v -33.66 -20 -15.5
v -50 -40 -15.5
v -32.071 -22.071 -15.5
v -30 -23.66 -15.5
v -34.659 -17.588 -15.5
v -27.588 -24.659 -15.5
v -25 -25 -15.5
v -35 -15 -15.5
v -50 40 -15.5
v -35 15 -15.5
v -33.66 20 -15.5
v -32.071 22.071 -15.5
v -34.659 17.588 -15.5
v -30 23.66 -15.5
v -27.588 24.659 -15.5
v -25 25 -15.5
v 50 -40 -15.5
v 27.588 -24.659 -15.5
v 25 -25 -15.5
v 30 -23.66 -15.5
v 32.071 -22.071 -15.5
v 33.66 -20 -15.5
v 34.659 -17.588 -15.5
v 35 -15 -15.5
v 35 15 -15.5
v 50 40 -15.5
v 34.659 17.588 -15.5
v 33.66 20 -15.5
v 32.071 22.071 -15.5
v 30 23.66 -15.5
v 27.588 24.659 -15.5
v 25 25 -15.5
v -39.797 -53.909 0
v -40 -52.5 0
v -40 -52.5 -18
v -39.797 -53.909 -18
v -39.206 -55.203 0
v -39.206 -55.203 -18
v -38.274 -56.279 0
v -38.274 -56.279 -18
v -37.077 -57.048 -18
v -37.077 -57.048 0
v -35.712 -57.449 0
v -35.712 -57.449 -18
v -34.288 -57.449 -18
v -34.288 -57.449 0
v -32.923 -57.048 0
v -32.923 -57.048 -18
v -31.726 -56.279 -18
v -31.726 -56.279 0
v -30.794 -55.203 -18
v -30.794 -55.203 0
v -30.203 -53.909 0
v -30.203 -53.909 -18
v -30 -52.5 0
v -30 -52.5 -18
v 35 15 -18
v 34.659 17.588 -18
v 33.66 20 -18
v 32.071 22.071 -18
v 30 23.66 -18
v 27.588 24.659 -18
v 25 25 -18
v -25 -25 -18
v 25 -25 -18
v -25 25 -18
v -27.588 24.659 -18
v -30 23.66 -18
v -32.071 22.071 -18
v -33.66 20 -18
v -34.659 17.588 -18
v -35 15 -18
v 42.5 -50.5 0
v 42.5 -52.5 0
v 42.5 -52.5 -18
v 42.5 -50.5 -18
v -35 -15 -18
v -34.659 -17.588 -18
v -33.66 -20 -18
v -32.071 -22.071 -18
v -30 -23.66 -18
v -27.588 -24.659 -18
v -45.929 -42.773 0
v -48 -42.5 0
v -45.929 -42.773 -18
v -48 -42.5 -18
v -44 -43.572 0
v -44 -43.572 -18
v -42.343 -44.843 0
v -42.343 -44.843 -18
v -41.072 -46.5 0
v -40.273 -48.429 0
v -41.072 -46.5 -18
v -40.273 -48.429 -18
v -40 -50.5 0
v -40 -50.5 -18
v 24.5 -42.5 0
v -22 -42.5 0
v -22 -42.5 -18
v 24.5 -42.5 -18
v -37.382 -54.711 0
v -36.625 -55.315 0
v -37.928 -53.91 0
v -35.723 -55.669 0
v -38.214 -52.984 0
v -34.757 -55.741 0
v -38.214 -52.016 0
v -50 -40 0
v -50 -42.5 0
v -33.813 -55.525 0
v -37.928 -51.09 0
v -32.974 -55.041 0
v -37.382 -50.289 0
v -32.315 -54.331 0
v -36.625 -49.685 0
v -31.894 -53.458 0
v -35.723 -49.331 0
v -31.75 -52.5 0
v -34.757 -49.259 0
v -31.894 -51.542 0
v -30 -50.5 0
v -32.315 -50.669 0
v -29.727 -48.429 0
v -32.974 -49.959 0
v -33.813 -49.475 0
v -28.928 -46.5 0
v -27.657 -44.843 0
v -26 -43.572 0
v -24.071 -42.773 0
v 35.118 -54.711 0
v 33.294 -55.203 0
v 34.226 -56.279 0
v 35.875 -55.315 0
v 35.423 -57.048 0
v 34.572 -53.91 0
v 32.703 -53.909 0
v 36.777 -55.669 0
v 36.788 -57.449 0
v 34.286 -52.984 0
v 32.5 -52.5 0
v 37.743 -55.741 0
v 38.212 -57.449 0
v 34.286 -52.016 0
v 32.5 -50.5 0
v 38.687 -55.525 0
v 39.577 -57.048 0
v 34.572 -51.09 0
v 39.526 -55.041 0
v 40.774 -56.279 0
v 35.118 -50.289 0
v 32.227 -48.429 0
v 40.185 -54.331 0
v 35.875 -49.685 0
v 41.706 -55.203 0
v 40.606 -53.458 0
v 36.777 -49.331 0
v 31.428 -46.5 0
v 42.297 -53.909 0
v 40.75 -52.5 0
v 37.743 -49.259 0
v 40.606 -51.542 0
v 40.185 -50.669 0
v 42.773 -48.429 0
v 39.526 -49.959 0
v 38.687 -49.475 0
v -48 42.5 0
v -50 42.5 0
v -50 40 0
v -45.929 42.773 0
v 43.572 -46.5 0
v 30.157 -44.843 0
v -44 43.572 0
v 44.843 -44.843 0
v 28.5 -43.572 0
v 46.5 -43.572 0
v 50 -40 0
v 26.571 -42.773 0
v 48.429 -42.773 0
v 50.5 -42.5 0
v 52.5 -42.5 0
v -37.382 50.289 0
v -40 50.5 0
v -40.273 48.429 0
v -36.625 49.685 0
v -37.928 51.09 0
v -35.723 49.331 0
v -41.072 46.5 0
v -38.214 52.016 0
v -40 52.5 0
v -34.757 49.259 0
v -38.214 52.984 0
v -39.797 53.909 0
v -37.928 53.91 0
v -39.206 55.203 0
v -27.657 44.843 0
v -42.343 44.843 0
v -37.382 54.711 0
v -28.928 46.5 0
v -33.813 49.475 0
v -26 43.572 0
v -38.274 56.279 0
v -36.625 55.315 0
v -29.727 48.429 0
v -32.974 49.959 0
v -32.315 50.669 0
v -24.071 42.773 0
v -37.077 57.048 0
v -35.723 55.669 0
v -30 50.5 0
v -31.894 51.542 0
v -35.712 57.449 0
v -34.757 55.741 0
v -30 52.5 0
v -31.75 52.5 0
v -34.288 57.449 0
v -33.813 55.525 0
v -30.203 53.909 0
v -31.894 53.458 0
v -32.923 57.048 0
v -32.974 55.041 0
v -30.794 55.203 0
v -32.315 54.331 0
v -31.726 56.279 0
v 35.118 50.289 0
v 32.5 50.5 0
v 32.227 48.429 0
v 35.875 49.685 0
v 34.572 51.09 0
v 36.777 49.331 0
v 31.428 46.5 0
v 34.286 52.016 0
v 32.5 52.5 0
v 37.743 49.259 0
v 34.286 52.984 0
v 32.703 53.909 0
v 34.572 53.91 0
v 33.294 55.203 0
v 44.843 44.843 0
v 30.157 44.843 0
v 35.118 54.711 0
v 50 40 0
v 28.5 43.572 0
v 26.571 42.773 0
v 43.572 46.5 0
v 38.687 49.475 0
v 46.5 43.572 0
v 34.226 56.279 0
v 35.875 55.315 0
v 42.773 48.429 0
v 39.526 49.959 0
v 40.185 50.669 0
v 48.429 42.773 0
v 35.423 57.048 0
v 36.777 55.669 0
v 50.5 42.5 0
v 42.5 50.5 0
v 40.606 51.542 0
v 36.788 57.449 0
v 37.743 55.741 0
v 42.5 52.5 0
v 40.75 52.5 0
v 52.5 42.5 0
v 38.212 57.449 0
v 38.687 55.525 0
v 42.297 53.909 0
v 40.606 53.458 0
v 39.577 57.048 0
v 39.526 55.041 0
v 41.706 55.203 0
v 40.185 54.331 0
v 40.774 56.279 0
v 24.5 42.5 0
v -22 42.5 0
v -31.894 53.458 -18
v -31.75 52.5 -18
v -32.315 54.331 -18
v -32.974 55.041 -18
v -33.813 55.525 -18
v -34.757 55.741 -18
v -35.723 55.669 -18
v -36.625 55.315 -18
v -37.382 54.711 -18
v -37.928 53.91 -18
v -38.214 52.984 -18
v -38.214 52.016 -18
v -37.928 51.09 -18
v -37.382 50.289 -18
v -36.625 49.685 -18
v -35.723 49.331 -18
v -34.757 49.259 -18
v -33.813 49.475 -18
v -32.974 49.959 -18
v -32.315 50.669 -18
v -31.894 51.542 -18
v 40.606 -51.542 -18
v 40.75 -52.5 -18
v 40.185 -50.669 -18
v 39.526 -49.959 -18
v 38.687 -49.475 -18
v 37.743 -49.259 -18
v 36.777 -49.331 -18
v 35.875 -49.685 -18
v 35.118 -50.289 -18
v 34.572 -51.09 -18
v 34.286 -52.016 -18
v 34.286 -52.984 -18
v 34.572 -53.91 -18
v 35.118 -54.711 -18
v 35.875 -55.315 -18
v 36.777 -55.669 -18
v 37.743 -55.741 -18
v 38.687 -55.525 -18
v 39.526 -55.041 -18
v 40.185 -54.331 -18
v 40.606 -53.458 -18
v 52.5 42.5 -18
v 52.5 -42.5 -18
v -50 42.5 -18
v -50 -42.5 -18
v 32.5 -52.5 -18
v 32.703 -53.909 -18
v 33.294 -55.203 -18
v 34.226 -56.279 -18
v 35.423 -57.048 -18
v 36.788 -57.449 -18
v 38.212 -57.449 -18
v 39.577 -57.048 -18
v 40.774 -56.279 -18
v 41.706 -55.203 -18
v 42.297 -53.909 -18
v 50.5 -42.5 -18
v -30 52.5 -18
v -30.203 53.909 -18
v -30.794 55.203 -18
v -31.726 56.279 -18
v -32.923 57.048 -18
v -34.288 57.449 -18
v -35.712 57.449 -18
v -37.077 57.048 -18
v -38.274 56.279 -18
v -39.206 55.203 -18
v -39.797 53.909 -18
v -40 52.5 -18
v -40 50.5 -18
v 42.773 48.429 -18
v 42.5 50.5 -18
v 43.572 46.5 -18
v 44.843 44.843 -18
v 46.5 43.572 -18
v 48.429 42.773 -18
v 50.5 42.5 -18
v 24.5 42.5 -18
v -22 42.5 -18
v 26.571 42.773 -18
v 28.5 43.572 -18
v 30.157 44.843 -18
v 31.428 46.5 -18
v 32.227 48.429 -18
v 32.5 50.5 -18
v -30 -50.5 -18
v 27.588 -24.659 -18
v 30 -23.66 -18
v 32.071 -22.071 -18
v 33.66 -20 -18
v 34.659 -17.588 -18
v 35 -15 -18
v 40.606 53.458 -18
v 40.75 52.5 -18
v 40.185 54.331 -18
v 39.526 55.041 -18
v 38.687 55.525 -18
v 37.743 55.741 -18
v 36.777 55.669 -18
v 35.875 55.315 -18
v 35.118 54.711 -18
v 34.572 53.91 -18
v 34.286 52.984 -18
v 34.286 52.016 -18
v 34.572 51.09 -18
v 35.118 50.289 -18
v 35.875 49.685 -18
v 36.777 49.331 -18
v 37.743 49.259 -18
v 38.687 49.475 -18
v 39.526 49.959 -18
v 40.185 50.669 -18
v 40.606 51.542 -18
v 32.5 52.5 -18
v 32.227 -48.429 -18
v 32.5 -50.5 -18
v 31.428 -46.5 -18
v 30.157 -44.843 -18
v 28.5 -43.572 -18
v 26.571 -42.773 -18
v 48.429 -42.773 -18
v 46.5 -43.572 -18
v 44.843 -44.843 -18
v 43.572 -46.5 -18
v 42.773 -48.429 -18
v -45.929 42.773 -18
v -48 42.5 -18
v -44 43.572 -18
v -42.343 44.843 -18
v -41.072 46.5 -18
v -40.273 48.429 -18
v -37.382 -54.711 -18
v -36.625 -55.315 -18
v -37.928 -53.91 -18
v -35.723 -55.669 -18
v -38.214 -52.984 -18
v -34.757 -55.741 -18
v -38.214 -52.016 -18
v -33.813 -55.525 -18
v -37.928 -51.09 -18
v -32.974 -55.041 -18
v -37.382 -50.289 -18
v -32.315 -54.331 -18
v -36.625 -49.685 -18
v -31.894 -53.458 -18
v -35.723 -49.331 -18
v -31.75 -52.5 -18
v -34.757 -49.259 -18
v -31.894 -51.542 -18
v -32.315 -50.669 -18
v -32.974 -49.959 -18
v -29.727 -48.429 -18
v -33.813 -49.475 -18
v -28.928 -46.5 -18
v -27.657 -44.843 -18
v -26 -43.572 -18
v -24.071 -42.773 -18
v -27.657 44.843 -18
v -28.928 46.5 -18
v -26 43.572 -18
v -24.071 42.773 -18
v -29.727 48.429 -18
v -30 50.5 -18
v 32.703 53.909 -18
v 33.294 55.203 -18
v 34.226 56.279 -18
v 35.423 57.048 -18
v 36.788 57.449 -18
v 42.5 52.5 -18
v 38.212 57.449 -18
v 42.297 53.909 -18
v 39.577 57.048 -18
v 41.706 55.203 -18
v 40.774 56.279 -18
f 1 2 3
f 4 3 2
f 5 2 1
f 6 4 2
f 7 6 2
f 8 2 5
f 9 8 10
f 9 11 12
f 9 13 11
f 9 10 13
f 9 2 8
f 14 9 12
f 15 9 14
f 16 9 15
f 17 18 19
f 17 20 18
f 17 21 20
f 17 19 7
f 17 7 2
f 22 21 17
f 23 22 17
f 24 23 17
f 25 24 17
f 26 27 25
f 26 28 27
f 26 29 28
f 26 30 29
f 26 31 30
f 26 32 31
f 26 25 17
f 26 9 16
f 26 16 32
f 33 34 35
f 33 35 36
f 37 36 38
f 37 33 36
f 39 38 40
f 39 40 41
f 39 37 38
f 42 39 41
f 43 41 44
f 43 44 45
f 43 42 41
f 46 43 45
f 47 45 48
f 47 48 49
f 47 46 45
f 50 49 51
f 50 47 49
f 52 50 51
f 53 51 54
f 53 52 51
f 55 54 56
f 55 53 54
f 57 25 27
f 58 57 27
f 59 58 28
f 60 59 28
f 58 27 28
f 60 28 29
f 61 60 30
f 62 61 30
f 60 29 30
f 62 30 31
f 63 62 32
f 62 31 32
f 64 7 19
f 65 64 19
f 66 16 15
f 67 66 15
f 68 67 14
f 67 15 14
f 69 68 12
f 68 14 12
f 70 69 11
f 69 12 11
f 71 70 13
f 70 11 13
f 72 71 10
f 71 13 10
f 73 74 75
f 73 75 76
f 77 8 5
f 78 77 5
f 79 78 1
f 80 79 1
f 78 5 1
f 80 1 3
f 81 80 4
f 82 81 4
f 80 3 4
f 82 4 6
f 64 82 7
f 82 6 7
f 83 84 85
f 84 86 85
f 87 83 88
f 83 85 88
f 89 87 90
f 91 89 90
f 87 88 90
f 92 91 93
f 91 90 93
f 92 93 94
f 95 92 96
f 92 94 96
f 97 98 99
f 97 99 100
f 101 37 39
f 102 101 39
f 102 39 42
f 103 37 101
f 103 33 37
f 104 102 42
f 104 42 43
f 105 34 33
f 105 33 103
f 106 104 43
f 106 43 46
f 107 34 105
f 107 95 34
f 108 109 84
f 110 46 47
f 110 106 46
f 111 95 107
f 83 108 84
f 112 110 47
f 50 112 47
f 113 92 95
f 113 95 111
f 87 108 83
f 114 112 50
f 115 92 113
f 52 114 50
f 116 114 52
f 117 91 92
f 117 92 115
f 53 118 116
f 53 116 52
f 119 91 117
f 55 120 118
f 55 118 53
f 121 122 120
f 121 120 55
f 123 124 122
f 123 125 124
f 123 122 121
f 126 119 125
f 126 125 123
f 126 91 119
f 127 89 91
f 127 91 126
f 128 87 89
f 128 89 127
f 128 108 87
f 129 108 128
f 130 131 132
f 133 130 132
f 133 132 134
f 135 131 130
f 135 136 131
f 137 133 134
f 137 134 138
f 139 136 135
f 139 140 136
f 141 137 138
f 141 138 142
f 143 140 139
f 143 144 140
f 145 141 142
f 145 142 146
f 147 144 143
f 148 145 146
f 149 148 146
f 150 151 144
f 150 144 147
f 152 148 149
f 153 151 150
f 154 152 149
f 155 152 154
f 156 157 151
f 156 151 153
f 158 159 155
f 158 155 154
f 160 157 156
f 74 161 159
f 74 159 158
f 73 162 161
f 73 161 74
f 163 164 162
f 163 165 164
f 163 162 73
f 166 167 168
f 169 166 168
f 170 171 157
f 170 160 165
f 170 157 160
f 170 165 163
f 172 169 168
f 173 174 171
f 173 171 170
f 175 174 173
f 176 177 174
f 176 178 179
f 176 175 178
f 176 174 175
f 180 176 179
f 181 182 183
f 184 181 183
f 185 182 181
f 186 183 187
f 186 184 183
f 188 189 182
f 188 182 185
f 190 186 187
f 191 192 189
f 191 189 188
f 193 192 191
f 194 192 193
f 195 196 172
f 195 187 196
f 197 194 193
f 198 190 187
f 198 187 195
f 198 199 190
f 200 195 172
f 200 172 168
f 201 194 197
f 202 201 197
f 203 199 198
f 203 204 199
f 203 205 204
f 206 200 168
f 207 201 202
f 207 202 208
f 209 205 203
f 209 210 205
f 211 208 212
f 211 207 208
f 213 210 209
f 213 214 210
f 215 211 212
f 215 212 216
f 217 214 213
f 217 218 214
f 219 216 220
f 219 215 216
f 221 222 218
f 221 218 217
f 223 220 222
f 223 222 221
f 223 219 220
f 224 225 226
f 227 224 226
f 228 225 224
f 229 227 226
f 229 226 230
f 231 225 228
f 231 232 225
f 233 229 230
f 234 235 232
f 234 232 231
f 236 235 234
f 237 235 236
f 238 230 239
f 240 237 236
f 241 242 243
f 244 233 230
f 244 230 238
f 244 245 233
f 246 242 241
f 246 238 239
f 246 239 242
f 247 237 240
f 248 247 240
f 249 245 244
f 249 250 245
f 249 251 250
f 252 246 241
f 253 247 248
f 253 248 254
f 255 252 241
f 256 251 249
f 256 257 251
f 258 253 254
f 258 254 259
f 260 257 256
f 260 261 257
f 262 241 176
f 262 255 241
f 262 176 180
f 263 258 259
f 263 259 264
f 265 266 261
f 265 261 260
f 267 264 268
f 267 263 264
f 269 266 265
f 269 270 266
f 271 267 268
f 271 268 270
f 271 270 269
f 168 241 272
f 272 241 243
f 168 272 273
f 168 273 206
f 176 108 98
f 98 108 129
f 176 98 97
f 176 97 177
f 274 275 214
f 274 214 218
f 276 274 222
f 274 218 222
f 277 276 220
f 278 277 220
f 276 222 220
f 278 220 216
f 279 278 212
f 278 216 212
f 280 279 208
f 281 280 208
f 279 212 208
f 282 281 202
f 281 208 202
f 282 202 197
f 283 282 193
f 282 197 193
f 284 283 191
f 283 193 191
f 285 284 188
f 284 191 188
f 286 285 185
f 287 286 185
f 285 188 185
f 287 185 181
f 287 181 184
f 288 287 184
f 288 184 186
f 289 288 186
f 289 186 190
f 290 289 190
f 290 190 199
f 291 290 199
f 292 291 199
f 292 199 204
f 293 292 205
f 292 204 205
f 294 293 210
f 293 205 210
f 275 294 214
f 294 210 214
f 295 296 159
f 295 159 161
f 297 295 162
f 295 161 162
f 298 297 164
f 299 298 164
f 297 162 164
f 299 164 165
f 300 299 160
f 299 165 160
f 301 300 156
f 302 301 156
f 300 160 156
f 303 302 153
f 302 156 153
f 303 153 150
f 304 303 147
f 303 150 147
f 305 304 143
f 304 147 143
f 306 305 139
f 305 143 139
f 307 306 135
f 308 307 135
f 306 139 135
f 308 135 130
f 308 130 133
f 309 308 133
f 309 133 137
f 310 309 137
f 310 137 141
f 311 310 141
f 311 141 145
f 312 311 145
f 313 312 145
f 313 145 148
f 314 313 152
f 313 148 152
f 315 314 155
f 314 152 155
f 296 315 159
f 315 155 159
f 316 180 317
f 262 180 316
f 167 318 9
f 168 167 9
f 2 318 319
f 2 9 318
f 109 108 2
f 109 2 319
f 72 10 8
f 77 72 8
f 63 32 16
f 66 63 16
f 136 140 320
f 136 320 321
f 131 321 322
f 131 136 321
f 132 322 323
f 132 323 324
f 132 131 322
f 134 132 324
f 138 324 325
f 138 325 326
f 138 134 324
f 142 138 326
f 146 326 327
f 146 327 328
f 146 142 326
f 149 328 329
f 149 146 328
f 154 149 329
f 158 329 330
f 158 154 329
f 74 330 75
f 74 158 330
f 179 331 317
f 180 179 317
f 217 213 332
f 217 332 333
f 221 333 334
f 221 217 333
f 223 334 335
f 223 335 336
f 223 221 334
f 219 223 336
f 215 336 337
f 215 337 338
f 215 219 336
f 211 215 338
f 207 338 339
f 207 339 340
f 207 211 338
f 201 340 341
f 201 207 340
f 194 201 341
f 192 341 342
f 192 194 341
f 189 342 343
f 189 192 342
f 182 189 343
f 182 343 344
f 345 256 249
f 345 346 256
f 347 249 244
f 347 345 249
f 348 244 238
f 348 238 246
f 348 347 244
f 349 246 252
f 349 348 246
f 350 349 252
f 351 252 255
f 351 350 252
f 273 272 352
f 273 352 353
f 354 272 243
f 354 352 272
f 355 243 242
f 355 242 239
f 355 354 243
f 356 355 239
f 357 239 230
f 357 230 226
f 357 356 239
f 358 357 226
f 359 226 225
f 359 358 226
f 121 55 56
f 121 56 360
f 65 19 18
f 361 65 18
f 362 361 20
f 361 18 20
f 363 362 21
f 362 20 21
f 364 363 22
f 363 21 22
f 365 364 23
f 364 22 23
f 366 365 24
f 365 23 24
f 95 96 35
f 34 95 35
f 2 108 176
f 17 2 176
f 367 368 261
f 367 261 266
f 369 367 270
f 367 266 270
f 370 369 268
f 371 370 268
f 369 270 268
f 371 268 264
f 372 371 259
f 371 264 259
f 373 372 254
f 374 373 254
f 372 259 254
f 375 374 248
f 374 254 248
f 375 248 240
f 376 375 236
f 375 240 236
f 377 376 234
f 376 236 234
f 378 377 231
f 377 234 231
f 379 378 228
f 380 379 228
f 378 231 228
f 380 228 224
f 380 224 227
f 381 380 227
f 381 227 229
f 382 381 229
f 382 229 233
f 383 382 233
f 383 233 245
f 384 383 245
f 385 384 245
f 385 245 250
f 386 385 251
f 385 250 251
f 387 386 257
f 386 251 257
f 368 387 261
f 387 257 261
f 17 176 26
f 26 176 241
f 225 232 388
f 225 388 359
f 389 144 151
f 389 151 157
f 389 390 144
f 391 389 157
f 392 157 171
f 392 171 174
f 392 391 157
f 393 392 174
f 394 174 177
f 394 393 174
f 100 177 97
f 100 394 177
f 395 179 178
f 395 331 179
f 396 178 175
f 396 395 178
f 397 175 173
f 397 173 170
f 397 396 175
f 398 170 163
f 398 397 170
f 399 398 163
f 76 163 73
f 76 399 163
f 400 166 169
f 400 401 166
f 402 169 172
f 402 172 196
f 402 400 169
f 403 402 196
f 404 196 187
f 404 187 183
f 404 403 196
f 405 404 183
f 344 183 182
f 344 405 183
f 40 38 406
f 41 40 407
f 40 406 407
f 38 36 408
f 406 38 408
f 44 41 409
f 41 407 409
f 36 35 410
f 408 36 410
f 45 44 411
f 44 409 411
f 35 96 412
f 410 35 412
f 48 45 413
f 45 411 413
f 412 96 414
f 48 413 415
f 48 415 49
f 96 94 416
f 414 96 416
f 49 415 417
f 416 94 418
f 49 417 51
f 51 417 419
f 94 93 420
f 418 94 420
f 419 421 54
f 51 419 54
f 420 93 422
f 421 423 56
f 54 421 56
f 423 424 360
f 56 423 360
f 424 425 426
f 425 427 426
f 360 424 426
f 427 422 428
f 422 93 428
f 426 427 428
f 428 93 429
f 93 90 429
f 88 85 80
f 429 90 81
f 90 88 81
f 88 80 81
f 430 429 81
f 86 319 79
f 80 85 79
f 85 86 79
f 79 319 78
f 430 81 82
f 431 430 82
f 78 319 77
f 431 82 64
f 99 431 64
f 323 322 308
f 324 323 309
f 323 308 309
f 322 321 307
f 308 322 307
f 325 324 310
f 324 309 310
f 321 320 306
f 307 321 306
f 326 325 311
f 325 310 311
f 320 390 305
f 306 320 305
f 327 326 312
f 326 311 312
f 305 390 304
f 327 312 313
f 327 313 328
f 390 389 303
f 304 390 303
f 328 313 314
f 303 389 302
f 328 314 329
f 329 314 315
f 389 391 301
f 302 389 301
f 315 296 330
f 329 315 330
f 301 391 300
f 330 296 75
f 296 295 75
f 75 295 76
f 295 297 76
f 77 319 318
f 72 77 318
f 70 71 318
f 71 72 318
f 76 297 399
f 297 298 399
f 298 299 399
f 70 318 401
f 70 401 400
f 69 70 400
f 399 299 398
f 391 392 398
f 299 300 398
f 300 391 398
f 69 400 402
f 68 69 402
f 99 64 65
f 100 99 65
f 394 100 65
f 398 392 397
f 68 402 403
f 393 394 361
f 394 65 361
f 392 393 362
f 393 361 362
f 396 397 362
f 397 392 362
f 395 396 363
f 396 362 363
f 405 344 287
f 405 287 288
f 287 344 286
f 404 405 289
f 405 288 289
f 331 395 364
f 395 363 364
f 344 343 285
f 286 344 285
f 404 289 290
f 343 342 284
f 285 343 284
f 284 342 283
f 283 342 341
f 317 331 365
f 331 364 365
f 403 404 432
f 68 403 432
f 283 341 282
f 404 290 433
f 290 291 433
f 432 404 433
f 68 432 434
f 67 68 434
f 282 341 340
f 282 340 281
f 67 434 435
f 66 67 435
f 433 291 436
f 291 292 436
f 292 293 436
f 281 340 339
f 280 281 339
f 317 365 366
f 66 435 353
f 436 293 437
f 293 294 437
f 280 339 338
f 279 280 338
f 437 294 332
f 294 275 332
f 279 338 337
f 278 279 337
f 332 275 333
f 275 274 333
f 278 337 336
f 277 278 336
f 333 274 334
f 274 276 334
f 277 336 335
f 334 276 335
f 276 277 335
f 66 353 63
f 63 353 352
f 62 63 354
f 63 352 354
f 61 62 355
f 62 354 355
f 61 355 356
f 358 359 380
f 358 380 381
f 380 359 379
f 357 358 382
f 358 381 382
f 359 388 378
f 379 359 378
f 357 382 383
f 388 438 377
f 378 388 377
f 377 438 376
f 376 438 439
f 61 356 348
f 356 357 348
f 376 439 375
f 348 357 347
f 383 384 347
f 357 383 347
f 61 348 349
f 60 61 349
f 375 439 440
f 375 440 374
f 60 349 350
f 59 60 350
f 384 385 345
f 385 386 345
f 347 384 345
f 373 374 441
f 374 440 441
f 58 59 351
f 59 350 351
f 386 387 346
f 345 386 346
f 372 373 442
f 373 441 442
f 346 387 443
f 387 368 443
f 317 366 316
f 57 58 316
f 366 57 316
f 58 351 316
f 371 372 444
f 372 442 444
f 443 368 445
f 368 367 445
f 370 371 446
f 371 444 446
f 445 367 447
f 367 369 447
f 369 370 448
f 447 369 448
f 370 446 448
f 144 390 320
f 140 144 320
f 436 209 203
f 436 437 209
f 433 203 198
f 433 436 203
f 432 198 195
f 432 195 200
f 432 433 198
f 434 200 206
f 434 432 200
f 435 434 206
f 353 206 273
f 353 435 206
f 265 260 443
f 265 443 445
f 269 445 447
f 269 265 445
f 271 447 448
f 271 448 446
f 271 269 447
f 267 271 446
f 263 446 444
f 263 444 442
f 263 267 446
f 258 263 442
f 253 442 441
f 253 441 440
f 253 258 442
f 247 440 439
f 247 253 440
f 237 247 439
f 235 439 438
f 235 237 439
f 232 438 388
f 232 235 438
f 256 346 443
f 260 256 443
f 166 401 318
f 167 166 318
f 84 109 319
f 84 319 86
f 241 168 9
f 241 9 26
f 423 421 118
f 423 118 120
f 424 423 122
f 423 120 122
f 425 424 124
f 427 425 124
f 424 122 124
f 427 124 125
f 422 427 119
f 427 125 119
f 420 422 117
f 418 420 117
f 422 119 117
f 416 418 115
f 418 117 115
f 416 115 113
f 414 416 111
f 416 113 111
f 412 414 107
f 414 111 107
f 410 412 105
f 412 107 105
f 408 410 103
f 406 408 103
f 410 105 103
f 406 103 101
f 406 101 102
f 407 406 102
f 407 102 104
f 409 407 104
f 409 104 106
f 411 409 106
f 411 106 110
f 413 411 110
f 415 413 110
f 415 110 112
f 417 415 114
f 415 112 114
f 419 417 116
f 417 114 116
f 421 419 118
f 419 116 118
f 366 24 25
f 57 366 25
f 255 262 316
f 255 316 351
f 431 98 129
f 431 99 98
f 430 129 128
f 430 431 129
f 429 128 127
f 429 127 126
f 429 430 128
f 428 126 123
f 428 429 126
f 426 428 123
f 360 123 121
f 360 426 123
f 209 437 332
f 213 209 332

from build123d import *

# Parameters (mm, degrees)
F0_R     = 3.25
F3_DEPTH = 18
F2_W     = 100
F2_H     = 80
F4_DEPTH = 15.5
F5_DEPTH = 25
F6_R     = 8


with BuildPart() as f3:
    # F0 (on Top) → F3 (new body)
    with BuildSketch(Plane.XY):
        with BuildLine():
            Line((-50, 42.5), (-50, -42.5))
            Line((-50, -42.5), (-40, -42.5))
            Line((-40, -42.5), (-40, -52.5))
            ThreePointArc((-40, -52.5), (-35, -57.5), (-30, -52.5))
            Line((-30, -52.5), (-30, -42.5))
            Line((-30, -42.5), (32.5, -42.5))
            Line((32.5, -42.5), (32.5, -52.5))
            ThreePointArc((32.5, -52.5), (37.5, -57.5), (42.5, -52.5))
            Line((42.5, -52.5), (42.5, -42.5))
            Line((42.5, -42.5), (52.5, -42.5))
            Line((52.5, -42.5), (52.5, 42.5))
            Line((52.5, 42.5), (42.5, 42.5))
            Line((42.5, 42.5), (42.5, 52.5))
            ThreePointArc((42.5, 52.5), (37.5, 57.5), (32.5, 52.5))
            Line((32.5, 52.5), (32.5, 42.5))
            Line((32.5, 42.5), (-30, 42.5))
            Line((-30, 42.5), (-30, 52.5))
            ThreePointArc((-30, 52.5), (-35, 57.5), (-40, 52.5))
            Line((-40, 52.5), (-40, 42.5))
            Line((-40, 42.5), (-50, 42.5))
        make_face()
        with Locations((-35, -52.5)):
            Circle(F0_R, mode=Mode.SUBTRACT)
        with Locations((37.5, -52.5)):
            Circle(F0_R, mode=Mode.SUBTRACT)
        with Locations((-35, 52.5)):
            Circle(F0_R, mode=Mode.SUBTRACT)
        with Locations((37.5, 52.5)):
            Circle(F0_R, mode=Mode.SUBTRACT)
    extrude(amount=-F3_DEPTH)

    # F2 (on face) → F4 (cut)
    with BuildSketch(Plane.XY):
        Rectangle(F2_W, F2_H)
    extrude(amount=-F4_DEPTH, mode=Mode.SUBTRACT)

    # F1 (on Top) → F5 (cut)
    with BuildSketch(Plane.XY):
        with BuildLine():
            Line((25, 25), (-25, 25))
            ThreePointArc((-25, 25), (-32.071068, 22.071068), (-35, 15))
            Line((-35, 15), (-35, -15))
            ThreePointArc((-35, -15), (-32.071068, -22.071068), (-25, -25))
            Line((-25, -25), (25, -25))
            ThreePointArc((25, -25), (32.071068, -22.071068), (35, -15))
            Line((35, -15), (35, 15))
            ThreePointArc((35, 15), (32.071068, 22.071068), (25, 25))
        make_face()
    extrude(amount=-F5_DEPTH, mode=Mode.SUBTRACT)

    # F6
    f6_edges = [f3.edges().sort_by_distance(p)[0] for p in [
        (-40, 42.5, -9),
        (32.5, 42.5, -9),
        (-40, -42.5, -9),
        (32.5, -42.5, -9),
        (42.5, -42.5, -9),
        (-30, -42.5, -9),
        (42.5, 42.5, -9),
        (-30, 42.5, -9),
    ]]
    fillet(f6_edges, radius=F6_R)


solid = f3.part
